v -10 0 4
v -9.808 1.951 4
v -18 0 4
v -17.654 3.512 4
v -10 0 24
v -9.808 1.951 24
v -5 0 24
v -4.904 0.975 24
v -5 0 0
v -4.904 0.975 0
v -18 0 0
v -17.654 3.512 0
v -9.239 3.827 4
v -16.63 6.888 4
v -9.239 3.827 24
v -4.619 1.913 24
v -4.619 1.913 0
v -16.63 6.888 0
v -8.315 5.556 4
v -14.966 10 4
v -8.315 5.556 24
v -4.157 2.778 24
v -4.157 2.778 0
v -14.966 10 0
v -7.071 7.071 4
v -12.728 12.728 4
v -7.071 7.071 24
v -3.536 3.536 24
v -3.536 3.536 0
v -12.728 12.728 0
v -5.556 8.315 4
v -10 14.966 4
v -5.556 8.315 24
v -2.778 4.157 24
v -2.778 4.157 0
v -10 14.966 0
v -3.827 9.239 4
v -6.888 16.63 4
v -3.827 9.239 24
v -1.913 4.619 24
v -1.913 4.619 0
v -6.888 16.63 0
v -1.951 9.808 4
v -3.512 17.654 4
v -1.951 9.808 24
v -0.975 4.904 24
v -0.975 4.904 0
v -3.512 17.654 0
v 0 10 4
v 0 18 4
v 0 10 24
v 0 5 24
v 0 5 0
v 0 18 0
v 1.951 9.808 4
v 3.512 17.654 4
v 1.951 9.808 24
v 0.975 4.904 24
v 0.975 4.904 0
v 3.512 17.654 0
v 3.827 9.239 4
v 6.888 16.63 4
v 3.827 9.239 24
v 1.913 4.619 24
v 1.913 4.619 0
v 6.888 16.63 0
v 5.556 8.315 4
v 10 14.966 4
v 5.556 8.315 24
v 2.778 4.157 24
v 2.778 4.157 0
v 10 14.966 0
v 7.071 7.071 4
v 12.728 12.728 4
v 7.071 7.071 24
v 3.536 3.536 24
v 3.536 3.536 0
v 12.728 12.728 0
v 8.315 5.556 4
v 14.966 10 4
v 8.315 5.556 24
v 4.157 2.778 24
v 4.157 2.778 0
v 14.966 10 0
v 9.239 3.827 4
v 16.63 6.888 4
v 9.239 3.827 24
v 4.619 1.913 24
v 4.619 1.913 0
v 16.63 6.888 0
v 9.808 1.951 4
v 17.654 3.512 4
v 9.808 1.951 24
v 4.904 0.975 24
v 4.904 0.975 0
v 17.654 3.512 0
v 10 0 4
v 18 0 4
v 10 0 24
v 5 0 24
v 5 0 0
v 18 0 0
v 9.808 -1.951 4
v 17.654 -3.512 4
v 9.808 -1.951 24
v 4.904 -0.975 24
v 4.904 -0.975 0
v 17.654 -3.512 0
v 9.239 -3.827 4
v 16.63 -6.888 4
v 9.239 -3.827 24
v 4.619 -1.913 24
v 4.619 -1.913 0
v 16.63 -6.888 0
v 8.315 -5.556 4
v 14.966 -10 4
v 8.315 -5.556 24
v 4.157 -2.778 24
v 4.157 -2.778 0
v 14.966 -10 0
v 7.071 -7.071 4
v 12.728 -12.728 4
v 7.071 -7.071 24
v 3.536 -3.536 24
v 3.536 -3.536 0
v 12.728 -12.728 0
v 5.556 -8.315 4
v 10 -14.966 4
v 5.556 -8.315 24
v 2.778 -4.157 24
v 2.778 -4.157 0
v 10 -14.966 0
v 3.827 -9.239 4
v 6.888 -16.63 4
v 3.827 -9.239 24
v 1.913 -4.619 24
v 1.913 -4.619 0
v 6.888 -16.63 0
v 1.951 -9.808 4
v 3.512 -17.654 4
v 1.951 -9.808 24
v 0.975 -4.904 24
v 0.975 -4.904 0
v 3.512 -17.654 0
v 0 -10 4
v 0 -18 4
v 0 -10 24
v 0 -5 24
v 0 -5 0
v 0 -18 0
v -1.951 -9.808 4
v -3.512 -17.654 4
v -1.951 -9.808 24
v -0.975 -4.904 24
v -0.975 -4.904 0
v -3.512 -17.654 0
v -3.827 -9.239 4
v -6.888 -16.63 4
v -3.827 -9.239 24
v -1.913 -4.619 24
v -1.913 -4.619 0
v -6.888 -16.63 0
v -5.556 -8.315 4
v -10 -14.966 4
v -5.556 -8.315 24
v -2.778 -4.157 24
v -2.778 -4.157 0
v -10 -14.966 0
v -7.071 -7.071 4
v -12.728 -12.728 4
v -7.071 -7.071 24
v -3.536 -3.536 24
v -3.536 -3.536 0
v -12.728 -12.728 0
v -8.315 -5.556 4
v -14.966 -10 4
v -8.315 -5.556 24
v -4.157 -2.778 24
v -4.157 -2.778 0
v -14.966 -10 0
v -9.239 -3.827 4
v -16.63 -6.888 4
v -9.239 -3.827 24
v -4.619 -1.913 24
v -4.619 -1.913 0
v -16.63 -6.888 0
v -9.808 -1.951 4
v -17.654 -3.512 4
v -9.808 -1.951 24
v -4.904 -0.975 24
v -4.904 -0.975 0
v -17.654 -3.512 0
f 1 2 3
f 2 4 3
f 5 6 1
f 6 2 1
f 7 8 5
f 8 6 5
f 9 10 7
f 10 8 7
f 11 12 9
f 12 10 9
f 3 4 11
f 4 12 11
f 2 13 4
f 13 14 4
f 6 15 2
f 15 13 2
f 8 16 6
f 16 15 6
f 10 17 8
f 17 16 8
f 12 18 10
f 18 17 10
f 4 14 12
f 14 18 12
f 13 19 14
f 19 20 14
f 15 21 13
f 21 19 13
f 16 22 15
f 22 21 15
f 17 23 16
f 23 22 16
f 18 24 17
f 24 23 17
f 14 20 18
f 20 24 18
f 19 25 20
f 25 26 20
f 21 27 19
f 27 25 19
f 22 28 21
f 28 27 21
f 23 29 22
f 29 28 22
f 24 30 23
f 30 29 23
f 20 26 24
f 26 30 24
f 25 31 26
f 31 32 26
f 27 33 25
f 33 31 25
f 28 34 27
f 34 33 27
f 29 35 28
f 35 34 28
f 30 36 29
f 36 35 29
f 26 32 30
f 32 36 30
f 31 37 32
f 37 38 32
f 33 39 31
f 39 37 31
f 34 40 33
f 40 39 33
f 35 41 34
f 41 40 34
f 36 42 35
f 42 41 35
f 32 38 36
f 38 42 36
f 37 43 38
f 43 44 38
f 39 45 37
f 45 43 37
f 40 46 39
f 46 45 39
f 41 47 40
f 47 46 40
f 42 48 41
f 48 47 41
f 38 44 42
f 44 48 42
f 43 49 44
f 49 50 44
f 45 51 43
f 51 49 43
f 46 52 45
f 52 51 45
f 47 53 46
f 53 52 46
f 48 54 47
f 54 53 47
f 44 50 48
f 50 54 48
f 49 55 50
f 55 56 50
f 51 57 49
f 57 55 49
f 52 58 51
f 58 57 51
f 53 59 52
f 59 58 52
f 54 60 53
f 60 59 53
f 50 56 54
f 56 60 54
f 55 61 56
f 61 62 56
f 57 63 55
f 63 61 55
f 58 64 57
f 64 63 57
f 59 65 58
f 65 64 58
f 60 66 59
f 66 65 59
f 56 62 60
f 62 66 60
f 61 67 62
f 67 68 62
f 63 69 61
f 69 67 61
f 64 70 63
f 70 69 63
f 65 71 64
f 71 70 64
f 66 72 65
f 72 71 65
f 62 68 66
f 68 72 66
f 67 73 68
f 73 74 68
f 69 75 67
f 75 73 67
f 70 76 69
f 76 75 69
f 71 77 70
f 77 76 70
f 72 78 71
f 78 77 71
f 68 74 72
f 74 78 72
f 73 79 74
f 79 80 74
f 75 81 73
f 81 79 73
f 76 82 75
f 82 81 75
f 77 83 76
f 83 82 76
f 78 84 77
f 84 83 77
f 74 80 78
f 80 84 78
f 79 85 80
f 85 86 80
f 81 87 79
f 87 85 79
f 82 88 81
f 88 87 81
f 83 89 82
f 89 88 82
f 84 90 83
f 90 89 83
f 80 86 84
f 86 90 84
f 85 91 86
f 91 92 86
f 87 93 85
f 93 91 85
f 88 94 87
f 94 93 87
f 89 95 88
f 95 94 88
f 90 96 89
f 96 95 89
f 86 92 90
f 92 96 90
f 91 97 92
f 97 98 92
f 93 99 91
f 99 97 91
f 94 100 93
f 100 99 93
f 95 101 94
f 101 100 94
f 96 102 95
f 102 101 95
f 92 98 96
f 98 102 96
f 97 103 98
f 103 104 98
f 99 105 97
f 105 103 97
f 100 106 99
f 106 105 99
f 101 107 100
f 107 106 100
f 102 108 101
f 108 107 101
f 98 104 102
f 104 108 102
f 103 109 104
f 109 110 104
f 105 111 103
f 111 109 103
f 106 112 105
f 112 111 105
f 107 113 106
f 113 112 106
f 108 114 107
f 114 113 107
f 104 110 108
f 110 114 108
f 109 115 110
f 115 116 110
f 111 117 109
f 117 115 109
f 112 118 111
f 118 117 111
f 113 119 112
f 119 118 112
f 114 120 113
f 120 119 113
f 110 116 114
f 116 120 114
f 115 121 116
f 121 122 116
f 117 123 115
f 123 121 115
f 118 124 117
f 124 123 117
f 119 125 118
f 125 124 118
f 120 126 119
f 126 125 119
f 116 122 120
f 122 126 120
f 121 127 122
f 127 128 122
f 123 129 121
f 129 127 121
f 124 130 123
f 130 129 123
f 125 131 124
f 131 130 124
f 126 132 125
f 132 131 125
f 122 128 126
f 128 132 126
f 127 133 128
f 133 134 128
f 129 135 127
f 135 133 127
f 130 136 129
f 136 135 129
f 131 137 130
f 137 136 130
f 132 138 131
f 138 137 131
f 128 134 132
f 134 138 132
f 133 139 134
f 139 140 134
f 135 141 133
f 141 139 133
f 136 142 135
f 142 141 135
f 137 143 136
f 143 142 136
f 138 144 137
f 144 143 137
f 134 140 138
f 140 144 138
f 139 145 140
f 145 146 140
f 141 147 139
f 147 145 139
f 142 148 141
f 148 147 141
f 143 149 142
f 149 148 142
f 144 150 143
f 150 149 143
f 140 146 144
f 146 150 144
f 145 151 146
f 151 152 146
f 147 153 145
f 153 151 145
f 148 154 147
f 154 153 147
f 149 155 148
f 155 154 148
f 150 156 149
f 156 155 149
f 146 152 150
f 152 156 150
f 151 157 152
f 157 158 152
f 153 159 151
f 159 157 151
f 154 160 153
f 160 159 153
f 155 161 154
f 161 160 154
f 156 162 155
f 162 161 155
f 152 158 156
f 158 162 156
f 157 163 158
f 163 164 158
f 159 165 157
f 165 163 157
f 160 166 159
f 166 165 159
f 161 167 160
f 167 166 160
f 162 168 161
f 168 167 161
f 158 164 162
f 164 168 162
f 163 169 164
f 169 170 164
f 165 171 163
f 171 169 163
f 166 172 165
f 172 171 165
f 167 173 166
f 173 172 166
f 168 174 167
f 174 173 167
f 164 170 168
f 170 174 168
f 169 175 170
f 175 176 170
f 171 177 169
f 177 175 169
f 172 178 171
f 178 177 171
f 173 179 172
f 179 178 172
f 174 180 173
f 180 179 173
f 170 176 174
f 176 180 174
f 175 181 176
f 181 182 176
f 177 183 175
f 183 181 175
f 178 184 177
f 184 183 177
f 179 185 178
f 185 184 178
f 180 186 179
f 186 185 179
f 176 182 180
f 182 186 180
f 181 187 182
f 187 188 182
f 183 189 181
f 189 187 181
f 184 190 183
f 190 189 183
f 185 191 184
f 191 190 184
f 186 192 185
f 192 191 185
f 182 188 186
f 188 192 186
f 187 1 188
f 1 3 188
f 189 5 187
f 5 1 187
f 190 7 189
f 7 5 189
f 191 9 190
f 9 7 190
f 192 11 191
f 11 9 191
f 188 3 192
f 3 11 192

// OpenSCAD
$fn = 32;

// ----------------------------------------------------------------------
// Revolved part: flanged bushing R18
// ----------------------------------------------------------------------

// --- parameters (mm) ---
bore_r = 5;               // bore radius
flange_r = 18;            // flange radius
flange_h = 4;             // flange thickness
sleeve_r = 10;            // sleeve radius
total_h = 24;             // overall height
revolve_angle = 360;      // revolve sweep, degrees

bore_d = 2 * bore_r;
flange_d = 2 * flange_r;
sleeve_d = 2 * sleeve_r;

profile = [[5, 0], [18, 0], [18, 4], [10, 4], [10, 24], [5, 24]];  // primary outline, 6 points, counter clockwise

// --- the one profile operation ---
rotate_extrude(angle = revolve_angle) polygon(points = profile);
